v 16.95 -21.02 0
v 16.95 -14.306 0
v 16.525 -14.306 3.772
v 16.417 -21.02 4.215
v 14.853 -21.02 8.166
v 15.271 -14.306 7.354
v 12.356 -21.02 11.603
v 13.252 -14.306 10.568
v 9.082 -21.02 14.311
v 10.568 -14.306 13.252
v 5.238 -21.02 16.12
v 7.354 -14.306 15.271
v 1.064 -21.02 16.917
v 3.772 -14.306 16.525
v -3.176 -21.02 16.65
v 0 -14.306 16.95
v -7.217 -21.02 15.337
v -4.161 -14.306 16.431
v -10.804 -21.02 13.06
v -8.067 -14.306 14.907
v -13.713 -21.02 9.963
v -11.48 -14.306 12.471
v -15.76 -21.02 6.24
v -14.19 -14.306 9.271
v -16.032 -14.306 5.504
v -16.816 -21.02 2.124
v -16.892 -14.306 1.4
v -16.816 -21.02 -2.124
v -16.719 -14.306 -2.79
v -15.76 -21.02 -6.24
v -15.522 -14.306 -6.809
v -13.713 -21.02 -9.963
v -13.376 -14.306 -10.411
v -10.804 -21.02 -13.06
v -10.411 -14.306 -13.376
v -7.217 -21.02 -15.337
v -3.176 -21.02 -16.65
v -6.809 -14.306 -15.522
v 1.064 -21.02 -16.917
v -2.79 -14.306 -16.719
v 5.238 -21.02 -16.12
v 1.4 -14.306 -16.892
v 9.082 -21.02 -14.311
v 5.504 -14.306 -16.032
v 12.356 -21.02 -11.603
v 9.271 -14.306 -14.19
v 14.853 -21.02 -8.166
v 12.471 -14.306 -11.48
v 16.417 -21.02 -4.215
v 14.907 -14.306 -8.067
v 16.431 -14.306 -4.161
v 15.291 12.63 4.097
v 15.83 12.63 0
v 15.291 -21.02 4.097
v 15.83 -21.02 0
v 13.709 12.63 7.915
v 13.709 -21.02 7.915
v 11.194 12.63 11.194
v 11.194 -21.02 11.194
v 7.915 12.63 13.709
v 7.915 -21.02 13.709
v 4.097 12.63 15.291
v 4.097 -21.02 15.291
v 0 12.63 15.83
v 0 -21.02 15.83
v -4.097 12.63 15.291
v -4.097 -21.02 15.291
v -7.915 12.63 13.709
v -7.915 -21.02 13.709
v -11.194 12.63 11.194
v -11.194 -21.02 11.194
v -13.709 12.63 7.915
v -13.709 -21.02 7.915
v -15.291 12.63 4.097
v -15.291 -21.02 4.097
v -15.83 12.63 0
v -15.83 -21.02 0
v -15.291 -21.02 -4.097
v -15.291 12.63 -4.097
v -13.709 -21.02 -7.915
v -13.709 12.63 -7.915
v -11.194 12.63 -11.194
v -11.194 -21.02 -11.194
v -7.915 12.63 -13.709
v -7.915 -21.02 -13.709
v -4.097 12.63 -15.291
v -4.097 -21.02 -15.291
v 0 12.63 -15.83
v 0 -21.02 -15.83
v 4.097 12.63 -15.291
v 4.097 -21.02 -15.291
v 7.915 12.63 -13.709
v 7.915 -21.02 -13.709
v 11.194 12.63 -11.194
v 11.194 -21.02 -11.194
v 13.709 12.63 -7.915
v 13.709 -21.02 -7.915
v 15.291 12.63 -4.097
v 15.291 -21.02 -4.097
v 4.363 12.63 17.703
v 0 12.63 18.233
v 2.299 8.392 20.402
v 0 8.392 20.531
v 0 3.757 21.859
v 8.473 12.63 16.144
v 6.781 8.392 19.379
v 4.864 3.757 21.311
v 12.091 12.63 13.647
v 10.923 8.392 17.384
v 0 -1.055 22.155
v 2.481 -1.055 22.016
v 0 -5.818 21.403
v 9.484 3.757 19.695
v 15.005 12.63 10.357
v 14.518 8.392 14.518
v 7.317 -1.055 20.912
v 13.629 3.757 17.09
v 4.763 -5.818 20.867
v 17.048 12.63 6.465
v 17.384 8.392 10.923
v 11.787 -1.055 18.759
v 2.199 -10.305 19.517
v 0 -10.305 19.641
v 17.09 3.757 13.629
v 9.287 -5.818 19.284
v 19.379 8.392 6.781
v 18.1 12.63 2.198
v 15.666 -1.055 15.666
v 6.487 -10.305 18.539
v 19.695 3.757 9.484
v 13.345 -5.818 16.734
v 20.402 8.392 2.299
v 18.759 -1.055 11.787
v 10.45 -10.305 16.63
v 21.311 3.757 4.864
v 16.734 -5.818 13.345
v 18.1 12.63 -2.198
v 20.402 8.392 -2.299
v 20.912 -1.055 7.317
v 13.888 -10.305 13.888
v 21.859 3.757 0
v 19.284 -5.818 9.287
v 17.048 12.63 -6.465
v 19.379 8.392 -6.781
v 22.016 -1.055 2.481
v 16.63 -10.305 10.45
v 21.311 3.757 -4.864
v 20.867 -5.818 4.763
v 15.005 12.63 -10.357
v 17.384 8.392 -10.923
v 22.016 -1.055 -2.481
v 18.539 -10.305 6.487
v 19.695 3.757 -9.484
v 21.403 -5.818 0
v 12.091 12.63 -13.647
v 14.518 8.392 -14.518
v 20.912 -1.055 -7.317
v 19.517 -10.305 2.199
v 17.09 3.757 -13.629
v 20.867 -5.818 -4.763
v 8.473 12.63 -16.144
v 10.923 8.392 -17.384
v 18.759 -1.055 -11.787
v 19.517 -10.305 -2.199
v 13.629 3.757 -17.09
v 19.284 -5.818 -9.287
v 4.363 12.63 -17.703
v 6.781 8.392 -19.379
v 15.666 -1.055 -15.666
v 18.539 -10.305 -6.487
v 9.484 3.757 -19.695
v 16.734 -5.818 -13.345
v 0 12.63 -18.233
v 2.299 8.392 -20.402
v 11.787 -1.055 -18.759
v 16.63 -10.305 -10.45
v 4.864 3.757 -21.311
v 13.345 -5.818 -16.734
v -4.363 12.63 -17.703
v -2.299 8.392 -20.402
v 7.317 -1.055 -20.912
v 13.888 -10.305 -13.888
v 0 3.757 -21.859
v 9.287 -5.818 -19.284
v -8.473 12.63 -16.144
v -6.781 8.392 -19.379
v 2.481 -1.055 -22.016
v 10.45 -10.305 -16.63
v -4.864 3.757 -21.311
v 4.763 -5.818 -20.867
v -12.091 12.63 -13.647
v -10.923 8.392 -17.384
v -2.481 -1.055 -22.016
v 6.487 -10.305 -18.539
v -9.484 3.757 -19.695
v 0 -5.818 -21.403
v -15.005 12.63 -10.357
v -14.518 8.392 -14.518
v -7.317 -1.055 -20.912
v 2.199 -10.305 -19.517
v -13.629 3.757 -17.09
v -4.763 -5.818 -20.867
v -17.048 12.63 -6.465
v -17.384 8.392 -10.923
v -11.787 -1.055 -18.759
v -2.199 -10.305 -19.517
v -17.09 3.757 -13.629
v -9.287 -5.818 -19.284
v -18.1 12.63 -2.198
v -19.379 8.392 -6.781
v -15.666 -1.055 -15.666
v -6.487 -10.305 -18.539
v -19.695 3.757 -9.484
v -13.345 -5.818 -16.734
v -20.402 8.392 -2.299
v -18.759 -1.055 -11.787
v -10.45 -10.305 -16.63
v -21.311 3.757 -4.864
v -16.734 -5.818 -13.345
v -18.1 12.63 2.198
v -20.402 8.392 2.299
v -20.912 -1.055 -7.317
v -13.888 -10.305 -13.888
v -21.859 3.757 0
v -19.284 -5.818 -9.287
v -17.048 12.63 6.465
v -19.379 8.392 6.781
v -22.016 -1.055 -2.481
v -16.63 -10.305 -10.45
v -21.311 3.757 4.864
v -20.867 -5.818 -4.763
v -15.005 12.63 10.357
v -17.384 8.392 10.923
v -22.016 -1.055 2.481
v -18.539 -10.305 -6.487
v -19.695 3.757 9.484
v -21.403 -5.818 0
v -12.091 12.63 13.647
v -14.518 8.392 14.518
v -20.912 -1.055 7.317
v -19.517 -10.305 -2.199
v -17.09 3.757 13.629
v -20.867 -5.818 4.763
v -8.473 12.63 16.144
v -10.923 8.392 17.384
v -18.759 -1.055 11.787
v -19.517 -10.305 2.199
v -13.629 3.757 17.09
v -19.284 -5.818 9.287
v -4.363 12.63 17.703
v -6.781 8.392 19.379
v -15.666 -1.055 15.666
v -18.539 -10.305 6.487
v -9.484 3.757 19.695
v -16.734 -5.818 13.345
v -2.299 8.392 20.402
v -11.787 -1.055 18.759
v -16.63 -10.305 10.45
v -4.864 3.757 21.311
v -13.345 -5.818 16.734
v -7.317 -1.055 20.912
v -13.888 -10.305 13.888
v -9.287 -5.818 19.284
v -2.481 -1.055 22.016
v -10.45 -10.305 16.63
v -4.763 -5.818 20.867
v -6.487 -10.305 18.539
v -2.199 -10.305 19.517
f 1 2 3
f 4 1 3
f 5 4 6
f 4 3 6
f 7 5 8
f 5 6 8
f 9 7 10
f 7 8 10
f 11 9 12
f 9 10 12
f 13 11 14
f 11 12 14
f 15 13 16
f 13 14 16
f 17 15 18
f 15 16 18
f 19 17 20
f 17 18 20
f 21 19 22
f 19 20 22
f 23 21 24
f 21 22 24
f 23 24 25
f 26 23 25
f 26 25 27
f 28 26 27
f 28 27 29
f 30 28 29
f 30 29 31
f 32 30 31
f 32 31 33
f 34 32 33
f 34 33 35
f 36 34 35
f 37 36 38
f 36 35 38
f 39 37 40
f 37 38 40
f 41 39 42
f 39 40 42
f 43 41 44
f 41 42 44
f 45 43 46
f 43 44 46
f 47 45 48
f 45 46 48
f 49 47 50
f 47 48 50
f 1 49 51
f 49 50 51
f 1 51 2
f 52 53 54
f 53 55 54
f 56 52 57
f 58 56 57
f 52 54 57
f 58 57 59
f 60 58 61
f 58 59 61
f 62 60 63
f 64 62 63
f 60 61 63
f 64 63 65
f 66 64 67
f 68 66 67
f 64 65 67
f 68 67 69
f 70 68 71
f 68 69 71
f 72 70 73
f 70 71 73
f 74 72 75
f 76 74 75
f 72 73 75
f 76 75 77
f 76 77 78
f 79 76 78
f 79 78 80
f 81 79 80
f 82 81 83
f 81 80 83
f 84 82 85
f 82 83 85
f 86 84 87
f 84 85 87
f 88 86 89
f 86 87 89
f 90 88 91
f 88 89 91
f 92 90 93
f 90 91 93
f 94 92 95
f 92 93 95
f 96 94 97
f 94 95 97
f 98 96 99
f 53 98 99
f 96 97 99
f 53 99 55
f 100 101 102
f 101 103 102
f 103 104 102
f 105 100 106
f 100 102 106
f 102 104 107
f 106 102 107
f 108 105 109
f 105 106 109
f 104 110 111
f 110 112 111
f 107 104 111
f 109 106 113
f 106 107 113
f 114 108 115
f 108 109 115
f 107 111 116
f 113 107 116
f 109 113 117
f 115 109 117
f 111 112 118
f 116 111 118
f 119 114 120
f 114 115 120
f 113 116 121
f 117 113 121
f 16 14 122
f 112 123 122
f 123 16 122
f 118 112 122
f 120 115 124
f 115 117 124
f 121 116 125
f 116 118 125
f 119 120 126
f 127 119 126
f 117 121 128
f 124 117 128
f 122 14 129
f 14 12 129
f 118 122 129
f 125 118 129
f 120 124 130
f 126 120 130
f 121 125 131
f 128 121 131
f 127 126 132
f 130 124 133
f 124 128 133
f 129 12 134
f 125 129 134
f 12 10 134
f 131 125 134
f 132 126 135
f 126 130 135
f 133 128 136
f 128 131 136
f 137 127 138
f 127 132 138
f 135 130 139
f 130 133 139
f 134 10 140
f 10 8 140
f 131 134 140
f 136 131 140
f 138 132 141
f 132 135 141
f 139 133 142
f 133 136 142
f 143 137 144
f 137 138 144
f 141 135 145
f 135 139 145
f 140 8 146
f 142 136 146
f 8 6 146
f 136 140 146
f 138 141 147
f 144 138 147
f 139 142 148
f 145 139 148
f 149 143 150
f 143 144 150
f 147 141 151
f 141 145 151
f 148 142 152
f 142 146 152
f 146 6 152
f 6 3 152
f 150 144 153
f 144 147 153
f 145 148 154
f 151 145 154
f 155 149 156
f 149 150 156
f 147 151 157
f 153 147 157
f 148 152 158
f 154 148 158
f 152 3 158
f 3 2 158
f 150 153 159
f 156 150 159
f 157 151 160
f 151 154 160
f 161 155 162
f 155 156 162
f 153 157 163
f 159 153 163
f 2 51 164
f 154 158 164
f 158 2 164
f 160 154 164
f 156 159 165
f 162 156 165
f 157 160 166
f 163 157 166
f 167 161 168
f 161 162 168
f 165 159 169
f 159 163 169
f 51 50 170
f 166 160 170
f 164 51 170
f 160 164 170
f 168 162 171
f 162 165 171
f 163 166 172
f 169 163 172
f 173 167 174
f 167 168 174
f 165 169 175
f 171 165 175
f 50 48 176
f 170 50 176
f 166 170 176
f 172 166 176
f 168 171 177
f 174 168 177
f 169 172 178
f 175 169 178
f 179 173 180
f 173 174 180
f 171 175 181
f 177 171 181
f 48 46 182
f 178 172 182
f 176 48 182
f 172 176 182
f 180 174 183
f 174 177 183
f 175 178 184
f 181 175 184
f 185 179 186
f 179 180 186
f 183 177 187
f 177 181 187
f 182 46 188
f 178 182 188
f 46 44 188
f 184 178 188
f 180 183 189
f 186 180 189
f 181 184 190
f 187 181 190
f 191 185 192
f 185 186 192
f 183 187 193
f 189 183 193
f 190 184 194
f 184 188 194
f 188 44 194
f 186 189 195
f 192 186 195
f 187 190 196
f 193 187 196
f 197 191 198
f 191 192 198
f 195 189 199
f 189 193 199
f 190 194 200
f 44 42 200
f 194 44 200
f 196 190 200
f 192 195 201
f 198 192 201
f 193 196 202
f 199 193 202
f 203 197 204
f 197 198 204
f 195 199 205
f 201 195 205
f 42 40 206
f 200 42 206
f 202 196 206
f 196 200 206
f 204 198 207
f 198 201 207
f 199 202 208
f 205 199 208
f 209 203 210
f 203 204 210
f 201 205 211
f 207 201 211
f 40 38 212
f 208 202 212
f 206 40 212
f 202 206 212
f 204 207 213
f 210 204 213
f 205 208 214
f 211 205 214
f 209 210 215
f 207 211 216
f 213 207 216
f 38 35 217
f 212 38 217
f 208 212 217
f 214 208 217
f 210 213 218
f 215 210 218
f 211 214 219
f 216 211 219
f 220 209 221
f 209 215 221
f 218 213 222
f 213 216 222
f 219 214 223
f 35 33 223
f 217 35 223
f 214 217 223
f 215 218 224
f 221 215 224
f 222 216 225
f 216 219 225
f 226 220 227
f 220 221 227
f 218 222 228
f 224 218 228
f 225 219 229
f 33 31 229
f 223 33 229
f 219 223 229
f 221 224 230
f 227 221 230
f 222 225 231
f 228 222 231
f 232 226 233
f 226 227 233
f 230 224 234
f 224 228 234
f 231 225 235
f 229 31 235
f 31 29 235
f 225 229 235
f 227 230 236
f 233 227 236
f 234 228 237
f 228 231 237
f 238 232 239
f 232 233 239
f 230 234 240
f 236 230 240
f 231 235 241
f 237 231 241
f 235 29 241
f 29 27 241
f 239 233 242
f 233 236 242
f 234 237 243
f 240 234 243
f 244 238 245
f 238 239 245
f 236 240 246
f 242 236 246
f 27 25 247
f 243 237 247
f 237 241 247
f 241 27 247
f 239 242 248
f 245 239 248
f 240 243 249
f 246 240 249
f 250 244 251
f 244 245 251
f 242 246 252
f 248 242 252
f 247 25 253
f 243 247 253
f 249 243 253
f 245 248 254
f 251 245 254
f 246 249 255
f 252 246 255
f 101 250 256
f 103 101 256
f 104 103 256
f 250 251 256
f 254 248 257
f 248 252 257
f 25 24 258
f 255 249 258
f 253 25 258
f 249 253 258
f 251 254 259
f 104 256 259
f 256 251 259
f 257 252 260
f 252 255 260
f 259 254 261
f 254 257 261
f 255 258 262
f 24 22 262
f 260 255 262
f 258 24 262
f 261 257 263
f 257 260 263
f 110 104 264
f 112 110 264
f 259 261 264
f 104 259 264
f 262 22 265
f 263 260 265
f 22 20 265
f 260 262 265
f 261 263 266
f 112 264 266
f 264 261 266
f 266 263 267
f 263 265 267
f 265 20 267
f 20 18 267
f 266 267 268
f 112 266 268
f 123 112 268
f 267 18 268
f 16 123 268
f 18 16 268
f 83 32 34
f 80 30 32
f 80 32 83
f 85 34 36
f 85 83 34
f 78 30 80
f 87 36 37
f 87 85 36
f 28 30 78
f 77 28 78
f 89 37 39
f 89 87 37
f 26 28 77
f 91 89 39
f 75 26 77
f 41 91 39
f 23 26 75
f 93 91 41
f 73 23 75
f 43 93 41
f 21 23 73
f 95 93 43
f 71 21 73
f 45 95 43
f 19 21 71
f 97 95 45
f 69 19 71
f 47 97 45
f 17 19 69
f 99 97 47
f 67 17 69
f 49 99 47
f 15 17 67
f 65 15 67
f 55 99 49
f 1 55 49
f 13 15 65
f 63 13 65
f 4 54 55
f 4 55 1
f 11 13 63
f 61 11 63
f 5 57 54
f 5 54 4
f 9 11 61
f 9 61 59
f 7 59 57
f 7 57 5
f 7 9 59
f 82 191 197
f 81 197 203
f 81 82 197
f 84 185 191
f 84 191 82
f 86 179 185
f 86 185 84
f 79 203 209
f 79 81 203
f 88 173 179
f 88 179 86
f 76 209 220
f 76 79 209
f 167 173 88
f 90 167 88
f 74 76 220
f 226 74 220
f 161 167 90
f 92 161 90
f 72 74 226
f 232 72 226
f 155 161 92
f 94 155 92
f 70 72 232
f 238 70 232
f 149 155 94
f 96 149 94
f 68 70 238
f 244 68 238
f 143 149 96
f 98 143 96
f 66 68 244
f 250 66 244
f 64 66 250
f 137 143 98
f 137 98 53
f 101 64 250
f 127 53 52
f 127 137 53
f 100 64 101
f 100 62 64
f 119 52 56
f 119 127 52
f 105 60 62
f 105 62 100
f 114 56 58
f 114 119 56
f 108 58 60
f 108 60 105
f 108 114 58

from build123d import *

# Parameters (mm, degrees)
F2_R     = 16.95
F3_DEPTH = 21.02
F4_R     = 15.83
F5_DEPTH = 50
F6_W     = 7.37
F6_H     = 60
F7_DEPTH = 50


with BuildPart() as f1:
    # F0 (on Right) → F1 (revolve)
    with BuildSketch(Plane.YZ):
        with BuildLine():
            Line((-22.18, 0), (22.18, 0))
            ThreePointArc((22.18, 0), (0, 22.18), (-22.18, 0))
        make_face()
    revolve(axis=Axis((0, 3.1962443806, 0), (0, 1, 0)))

    # F2 (on Front) → F3 (join)
    with BuildSketch(Plane.XZ):
        Circle(F2_R)
    extrude(amount=F3_DEPTH)

    # F4 (on face) → F5 (cut, symmetric)
    with BuildSketch(Plane.XZ.offset(21.02)):
        Circle(F4_R)
    extrude(amount=F5_DEPTH, both=True, mode=Mode.SUBTRACT)

    # F6 (on Right) → F7 (cut, symmetric)
    with BuildSketch(Plane.YZ):
        with Locations((16.315, 0)):
            Rectangle(F6_W, F6_H)
    extrude(amount=F7_DEPTH, both=True, mode=Mode.SUBTRACT)


solid = f1.part
